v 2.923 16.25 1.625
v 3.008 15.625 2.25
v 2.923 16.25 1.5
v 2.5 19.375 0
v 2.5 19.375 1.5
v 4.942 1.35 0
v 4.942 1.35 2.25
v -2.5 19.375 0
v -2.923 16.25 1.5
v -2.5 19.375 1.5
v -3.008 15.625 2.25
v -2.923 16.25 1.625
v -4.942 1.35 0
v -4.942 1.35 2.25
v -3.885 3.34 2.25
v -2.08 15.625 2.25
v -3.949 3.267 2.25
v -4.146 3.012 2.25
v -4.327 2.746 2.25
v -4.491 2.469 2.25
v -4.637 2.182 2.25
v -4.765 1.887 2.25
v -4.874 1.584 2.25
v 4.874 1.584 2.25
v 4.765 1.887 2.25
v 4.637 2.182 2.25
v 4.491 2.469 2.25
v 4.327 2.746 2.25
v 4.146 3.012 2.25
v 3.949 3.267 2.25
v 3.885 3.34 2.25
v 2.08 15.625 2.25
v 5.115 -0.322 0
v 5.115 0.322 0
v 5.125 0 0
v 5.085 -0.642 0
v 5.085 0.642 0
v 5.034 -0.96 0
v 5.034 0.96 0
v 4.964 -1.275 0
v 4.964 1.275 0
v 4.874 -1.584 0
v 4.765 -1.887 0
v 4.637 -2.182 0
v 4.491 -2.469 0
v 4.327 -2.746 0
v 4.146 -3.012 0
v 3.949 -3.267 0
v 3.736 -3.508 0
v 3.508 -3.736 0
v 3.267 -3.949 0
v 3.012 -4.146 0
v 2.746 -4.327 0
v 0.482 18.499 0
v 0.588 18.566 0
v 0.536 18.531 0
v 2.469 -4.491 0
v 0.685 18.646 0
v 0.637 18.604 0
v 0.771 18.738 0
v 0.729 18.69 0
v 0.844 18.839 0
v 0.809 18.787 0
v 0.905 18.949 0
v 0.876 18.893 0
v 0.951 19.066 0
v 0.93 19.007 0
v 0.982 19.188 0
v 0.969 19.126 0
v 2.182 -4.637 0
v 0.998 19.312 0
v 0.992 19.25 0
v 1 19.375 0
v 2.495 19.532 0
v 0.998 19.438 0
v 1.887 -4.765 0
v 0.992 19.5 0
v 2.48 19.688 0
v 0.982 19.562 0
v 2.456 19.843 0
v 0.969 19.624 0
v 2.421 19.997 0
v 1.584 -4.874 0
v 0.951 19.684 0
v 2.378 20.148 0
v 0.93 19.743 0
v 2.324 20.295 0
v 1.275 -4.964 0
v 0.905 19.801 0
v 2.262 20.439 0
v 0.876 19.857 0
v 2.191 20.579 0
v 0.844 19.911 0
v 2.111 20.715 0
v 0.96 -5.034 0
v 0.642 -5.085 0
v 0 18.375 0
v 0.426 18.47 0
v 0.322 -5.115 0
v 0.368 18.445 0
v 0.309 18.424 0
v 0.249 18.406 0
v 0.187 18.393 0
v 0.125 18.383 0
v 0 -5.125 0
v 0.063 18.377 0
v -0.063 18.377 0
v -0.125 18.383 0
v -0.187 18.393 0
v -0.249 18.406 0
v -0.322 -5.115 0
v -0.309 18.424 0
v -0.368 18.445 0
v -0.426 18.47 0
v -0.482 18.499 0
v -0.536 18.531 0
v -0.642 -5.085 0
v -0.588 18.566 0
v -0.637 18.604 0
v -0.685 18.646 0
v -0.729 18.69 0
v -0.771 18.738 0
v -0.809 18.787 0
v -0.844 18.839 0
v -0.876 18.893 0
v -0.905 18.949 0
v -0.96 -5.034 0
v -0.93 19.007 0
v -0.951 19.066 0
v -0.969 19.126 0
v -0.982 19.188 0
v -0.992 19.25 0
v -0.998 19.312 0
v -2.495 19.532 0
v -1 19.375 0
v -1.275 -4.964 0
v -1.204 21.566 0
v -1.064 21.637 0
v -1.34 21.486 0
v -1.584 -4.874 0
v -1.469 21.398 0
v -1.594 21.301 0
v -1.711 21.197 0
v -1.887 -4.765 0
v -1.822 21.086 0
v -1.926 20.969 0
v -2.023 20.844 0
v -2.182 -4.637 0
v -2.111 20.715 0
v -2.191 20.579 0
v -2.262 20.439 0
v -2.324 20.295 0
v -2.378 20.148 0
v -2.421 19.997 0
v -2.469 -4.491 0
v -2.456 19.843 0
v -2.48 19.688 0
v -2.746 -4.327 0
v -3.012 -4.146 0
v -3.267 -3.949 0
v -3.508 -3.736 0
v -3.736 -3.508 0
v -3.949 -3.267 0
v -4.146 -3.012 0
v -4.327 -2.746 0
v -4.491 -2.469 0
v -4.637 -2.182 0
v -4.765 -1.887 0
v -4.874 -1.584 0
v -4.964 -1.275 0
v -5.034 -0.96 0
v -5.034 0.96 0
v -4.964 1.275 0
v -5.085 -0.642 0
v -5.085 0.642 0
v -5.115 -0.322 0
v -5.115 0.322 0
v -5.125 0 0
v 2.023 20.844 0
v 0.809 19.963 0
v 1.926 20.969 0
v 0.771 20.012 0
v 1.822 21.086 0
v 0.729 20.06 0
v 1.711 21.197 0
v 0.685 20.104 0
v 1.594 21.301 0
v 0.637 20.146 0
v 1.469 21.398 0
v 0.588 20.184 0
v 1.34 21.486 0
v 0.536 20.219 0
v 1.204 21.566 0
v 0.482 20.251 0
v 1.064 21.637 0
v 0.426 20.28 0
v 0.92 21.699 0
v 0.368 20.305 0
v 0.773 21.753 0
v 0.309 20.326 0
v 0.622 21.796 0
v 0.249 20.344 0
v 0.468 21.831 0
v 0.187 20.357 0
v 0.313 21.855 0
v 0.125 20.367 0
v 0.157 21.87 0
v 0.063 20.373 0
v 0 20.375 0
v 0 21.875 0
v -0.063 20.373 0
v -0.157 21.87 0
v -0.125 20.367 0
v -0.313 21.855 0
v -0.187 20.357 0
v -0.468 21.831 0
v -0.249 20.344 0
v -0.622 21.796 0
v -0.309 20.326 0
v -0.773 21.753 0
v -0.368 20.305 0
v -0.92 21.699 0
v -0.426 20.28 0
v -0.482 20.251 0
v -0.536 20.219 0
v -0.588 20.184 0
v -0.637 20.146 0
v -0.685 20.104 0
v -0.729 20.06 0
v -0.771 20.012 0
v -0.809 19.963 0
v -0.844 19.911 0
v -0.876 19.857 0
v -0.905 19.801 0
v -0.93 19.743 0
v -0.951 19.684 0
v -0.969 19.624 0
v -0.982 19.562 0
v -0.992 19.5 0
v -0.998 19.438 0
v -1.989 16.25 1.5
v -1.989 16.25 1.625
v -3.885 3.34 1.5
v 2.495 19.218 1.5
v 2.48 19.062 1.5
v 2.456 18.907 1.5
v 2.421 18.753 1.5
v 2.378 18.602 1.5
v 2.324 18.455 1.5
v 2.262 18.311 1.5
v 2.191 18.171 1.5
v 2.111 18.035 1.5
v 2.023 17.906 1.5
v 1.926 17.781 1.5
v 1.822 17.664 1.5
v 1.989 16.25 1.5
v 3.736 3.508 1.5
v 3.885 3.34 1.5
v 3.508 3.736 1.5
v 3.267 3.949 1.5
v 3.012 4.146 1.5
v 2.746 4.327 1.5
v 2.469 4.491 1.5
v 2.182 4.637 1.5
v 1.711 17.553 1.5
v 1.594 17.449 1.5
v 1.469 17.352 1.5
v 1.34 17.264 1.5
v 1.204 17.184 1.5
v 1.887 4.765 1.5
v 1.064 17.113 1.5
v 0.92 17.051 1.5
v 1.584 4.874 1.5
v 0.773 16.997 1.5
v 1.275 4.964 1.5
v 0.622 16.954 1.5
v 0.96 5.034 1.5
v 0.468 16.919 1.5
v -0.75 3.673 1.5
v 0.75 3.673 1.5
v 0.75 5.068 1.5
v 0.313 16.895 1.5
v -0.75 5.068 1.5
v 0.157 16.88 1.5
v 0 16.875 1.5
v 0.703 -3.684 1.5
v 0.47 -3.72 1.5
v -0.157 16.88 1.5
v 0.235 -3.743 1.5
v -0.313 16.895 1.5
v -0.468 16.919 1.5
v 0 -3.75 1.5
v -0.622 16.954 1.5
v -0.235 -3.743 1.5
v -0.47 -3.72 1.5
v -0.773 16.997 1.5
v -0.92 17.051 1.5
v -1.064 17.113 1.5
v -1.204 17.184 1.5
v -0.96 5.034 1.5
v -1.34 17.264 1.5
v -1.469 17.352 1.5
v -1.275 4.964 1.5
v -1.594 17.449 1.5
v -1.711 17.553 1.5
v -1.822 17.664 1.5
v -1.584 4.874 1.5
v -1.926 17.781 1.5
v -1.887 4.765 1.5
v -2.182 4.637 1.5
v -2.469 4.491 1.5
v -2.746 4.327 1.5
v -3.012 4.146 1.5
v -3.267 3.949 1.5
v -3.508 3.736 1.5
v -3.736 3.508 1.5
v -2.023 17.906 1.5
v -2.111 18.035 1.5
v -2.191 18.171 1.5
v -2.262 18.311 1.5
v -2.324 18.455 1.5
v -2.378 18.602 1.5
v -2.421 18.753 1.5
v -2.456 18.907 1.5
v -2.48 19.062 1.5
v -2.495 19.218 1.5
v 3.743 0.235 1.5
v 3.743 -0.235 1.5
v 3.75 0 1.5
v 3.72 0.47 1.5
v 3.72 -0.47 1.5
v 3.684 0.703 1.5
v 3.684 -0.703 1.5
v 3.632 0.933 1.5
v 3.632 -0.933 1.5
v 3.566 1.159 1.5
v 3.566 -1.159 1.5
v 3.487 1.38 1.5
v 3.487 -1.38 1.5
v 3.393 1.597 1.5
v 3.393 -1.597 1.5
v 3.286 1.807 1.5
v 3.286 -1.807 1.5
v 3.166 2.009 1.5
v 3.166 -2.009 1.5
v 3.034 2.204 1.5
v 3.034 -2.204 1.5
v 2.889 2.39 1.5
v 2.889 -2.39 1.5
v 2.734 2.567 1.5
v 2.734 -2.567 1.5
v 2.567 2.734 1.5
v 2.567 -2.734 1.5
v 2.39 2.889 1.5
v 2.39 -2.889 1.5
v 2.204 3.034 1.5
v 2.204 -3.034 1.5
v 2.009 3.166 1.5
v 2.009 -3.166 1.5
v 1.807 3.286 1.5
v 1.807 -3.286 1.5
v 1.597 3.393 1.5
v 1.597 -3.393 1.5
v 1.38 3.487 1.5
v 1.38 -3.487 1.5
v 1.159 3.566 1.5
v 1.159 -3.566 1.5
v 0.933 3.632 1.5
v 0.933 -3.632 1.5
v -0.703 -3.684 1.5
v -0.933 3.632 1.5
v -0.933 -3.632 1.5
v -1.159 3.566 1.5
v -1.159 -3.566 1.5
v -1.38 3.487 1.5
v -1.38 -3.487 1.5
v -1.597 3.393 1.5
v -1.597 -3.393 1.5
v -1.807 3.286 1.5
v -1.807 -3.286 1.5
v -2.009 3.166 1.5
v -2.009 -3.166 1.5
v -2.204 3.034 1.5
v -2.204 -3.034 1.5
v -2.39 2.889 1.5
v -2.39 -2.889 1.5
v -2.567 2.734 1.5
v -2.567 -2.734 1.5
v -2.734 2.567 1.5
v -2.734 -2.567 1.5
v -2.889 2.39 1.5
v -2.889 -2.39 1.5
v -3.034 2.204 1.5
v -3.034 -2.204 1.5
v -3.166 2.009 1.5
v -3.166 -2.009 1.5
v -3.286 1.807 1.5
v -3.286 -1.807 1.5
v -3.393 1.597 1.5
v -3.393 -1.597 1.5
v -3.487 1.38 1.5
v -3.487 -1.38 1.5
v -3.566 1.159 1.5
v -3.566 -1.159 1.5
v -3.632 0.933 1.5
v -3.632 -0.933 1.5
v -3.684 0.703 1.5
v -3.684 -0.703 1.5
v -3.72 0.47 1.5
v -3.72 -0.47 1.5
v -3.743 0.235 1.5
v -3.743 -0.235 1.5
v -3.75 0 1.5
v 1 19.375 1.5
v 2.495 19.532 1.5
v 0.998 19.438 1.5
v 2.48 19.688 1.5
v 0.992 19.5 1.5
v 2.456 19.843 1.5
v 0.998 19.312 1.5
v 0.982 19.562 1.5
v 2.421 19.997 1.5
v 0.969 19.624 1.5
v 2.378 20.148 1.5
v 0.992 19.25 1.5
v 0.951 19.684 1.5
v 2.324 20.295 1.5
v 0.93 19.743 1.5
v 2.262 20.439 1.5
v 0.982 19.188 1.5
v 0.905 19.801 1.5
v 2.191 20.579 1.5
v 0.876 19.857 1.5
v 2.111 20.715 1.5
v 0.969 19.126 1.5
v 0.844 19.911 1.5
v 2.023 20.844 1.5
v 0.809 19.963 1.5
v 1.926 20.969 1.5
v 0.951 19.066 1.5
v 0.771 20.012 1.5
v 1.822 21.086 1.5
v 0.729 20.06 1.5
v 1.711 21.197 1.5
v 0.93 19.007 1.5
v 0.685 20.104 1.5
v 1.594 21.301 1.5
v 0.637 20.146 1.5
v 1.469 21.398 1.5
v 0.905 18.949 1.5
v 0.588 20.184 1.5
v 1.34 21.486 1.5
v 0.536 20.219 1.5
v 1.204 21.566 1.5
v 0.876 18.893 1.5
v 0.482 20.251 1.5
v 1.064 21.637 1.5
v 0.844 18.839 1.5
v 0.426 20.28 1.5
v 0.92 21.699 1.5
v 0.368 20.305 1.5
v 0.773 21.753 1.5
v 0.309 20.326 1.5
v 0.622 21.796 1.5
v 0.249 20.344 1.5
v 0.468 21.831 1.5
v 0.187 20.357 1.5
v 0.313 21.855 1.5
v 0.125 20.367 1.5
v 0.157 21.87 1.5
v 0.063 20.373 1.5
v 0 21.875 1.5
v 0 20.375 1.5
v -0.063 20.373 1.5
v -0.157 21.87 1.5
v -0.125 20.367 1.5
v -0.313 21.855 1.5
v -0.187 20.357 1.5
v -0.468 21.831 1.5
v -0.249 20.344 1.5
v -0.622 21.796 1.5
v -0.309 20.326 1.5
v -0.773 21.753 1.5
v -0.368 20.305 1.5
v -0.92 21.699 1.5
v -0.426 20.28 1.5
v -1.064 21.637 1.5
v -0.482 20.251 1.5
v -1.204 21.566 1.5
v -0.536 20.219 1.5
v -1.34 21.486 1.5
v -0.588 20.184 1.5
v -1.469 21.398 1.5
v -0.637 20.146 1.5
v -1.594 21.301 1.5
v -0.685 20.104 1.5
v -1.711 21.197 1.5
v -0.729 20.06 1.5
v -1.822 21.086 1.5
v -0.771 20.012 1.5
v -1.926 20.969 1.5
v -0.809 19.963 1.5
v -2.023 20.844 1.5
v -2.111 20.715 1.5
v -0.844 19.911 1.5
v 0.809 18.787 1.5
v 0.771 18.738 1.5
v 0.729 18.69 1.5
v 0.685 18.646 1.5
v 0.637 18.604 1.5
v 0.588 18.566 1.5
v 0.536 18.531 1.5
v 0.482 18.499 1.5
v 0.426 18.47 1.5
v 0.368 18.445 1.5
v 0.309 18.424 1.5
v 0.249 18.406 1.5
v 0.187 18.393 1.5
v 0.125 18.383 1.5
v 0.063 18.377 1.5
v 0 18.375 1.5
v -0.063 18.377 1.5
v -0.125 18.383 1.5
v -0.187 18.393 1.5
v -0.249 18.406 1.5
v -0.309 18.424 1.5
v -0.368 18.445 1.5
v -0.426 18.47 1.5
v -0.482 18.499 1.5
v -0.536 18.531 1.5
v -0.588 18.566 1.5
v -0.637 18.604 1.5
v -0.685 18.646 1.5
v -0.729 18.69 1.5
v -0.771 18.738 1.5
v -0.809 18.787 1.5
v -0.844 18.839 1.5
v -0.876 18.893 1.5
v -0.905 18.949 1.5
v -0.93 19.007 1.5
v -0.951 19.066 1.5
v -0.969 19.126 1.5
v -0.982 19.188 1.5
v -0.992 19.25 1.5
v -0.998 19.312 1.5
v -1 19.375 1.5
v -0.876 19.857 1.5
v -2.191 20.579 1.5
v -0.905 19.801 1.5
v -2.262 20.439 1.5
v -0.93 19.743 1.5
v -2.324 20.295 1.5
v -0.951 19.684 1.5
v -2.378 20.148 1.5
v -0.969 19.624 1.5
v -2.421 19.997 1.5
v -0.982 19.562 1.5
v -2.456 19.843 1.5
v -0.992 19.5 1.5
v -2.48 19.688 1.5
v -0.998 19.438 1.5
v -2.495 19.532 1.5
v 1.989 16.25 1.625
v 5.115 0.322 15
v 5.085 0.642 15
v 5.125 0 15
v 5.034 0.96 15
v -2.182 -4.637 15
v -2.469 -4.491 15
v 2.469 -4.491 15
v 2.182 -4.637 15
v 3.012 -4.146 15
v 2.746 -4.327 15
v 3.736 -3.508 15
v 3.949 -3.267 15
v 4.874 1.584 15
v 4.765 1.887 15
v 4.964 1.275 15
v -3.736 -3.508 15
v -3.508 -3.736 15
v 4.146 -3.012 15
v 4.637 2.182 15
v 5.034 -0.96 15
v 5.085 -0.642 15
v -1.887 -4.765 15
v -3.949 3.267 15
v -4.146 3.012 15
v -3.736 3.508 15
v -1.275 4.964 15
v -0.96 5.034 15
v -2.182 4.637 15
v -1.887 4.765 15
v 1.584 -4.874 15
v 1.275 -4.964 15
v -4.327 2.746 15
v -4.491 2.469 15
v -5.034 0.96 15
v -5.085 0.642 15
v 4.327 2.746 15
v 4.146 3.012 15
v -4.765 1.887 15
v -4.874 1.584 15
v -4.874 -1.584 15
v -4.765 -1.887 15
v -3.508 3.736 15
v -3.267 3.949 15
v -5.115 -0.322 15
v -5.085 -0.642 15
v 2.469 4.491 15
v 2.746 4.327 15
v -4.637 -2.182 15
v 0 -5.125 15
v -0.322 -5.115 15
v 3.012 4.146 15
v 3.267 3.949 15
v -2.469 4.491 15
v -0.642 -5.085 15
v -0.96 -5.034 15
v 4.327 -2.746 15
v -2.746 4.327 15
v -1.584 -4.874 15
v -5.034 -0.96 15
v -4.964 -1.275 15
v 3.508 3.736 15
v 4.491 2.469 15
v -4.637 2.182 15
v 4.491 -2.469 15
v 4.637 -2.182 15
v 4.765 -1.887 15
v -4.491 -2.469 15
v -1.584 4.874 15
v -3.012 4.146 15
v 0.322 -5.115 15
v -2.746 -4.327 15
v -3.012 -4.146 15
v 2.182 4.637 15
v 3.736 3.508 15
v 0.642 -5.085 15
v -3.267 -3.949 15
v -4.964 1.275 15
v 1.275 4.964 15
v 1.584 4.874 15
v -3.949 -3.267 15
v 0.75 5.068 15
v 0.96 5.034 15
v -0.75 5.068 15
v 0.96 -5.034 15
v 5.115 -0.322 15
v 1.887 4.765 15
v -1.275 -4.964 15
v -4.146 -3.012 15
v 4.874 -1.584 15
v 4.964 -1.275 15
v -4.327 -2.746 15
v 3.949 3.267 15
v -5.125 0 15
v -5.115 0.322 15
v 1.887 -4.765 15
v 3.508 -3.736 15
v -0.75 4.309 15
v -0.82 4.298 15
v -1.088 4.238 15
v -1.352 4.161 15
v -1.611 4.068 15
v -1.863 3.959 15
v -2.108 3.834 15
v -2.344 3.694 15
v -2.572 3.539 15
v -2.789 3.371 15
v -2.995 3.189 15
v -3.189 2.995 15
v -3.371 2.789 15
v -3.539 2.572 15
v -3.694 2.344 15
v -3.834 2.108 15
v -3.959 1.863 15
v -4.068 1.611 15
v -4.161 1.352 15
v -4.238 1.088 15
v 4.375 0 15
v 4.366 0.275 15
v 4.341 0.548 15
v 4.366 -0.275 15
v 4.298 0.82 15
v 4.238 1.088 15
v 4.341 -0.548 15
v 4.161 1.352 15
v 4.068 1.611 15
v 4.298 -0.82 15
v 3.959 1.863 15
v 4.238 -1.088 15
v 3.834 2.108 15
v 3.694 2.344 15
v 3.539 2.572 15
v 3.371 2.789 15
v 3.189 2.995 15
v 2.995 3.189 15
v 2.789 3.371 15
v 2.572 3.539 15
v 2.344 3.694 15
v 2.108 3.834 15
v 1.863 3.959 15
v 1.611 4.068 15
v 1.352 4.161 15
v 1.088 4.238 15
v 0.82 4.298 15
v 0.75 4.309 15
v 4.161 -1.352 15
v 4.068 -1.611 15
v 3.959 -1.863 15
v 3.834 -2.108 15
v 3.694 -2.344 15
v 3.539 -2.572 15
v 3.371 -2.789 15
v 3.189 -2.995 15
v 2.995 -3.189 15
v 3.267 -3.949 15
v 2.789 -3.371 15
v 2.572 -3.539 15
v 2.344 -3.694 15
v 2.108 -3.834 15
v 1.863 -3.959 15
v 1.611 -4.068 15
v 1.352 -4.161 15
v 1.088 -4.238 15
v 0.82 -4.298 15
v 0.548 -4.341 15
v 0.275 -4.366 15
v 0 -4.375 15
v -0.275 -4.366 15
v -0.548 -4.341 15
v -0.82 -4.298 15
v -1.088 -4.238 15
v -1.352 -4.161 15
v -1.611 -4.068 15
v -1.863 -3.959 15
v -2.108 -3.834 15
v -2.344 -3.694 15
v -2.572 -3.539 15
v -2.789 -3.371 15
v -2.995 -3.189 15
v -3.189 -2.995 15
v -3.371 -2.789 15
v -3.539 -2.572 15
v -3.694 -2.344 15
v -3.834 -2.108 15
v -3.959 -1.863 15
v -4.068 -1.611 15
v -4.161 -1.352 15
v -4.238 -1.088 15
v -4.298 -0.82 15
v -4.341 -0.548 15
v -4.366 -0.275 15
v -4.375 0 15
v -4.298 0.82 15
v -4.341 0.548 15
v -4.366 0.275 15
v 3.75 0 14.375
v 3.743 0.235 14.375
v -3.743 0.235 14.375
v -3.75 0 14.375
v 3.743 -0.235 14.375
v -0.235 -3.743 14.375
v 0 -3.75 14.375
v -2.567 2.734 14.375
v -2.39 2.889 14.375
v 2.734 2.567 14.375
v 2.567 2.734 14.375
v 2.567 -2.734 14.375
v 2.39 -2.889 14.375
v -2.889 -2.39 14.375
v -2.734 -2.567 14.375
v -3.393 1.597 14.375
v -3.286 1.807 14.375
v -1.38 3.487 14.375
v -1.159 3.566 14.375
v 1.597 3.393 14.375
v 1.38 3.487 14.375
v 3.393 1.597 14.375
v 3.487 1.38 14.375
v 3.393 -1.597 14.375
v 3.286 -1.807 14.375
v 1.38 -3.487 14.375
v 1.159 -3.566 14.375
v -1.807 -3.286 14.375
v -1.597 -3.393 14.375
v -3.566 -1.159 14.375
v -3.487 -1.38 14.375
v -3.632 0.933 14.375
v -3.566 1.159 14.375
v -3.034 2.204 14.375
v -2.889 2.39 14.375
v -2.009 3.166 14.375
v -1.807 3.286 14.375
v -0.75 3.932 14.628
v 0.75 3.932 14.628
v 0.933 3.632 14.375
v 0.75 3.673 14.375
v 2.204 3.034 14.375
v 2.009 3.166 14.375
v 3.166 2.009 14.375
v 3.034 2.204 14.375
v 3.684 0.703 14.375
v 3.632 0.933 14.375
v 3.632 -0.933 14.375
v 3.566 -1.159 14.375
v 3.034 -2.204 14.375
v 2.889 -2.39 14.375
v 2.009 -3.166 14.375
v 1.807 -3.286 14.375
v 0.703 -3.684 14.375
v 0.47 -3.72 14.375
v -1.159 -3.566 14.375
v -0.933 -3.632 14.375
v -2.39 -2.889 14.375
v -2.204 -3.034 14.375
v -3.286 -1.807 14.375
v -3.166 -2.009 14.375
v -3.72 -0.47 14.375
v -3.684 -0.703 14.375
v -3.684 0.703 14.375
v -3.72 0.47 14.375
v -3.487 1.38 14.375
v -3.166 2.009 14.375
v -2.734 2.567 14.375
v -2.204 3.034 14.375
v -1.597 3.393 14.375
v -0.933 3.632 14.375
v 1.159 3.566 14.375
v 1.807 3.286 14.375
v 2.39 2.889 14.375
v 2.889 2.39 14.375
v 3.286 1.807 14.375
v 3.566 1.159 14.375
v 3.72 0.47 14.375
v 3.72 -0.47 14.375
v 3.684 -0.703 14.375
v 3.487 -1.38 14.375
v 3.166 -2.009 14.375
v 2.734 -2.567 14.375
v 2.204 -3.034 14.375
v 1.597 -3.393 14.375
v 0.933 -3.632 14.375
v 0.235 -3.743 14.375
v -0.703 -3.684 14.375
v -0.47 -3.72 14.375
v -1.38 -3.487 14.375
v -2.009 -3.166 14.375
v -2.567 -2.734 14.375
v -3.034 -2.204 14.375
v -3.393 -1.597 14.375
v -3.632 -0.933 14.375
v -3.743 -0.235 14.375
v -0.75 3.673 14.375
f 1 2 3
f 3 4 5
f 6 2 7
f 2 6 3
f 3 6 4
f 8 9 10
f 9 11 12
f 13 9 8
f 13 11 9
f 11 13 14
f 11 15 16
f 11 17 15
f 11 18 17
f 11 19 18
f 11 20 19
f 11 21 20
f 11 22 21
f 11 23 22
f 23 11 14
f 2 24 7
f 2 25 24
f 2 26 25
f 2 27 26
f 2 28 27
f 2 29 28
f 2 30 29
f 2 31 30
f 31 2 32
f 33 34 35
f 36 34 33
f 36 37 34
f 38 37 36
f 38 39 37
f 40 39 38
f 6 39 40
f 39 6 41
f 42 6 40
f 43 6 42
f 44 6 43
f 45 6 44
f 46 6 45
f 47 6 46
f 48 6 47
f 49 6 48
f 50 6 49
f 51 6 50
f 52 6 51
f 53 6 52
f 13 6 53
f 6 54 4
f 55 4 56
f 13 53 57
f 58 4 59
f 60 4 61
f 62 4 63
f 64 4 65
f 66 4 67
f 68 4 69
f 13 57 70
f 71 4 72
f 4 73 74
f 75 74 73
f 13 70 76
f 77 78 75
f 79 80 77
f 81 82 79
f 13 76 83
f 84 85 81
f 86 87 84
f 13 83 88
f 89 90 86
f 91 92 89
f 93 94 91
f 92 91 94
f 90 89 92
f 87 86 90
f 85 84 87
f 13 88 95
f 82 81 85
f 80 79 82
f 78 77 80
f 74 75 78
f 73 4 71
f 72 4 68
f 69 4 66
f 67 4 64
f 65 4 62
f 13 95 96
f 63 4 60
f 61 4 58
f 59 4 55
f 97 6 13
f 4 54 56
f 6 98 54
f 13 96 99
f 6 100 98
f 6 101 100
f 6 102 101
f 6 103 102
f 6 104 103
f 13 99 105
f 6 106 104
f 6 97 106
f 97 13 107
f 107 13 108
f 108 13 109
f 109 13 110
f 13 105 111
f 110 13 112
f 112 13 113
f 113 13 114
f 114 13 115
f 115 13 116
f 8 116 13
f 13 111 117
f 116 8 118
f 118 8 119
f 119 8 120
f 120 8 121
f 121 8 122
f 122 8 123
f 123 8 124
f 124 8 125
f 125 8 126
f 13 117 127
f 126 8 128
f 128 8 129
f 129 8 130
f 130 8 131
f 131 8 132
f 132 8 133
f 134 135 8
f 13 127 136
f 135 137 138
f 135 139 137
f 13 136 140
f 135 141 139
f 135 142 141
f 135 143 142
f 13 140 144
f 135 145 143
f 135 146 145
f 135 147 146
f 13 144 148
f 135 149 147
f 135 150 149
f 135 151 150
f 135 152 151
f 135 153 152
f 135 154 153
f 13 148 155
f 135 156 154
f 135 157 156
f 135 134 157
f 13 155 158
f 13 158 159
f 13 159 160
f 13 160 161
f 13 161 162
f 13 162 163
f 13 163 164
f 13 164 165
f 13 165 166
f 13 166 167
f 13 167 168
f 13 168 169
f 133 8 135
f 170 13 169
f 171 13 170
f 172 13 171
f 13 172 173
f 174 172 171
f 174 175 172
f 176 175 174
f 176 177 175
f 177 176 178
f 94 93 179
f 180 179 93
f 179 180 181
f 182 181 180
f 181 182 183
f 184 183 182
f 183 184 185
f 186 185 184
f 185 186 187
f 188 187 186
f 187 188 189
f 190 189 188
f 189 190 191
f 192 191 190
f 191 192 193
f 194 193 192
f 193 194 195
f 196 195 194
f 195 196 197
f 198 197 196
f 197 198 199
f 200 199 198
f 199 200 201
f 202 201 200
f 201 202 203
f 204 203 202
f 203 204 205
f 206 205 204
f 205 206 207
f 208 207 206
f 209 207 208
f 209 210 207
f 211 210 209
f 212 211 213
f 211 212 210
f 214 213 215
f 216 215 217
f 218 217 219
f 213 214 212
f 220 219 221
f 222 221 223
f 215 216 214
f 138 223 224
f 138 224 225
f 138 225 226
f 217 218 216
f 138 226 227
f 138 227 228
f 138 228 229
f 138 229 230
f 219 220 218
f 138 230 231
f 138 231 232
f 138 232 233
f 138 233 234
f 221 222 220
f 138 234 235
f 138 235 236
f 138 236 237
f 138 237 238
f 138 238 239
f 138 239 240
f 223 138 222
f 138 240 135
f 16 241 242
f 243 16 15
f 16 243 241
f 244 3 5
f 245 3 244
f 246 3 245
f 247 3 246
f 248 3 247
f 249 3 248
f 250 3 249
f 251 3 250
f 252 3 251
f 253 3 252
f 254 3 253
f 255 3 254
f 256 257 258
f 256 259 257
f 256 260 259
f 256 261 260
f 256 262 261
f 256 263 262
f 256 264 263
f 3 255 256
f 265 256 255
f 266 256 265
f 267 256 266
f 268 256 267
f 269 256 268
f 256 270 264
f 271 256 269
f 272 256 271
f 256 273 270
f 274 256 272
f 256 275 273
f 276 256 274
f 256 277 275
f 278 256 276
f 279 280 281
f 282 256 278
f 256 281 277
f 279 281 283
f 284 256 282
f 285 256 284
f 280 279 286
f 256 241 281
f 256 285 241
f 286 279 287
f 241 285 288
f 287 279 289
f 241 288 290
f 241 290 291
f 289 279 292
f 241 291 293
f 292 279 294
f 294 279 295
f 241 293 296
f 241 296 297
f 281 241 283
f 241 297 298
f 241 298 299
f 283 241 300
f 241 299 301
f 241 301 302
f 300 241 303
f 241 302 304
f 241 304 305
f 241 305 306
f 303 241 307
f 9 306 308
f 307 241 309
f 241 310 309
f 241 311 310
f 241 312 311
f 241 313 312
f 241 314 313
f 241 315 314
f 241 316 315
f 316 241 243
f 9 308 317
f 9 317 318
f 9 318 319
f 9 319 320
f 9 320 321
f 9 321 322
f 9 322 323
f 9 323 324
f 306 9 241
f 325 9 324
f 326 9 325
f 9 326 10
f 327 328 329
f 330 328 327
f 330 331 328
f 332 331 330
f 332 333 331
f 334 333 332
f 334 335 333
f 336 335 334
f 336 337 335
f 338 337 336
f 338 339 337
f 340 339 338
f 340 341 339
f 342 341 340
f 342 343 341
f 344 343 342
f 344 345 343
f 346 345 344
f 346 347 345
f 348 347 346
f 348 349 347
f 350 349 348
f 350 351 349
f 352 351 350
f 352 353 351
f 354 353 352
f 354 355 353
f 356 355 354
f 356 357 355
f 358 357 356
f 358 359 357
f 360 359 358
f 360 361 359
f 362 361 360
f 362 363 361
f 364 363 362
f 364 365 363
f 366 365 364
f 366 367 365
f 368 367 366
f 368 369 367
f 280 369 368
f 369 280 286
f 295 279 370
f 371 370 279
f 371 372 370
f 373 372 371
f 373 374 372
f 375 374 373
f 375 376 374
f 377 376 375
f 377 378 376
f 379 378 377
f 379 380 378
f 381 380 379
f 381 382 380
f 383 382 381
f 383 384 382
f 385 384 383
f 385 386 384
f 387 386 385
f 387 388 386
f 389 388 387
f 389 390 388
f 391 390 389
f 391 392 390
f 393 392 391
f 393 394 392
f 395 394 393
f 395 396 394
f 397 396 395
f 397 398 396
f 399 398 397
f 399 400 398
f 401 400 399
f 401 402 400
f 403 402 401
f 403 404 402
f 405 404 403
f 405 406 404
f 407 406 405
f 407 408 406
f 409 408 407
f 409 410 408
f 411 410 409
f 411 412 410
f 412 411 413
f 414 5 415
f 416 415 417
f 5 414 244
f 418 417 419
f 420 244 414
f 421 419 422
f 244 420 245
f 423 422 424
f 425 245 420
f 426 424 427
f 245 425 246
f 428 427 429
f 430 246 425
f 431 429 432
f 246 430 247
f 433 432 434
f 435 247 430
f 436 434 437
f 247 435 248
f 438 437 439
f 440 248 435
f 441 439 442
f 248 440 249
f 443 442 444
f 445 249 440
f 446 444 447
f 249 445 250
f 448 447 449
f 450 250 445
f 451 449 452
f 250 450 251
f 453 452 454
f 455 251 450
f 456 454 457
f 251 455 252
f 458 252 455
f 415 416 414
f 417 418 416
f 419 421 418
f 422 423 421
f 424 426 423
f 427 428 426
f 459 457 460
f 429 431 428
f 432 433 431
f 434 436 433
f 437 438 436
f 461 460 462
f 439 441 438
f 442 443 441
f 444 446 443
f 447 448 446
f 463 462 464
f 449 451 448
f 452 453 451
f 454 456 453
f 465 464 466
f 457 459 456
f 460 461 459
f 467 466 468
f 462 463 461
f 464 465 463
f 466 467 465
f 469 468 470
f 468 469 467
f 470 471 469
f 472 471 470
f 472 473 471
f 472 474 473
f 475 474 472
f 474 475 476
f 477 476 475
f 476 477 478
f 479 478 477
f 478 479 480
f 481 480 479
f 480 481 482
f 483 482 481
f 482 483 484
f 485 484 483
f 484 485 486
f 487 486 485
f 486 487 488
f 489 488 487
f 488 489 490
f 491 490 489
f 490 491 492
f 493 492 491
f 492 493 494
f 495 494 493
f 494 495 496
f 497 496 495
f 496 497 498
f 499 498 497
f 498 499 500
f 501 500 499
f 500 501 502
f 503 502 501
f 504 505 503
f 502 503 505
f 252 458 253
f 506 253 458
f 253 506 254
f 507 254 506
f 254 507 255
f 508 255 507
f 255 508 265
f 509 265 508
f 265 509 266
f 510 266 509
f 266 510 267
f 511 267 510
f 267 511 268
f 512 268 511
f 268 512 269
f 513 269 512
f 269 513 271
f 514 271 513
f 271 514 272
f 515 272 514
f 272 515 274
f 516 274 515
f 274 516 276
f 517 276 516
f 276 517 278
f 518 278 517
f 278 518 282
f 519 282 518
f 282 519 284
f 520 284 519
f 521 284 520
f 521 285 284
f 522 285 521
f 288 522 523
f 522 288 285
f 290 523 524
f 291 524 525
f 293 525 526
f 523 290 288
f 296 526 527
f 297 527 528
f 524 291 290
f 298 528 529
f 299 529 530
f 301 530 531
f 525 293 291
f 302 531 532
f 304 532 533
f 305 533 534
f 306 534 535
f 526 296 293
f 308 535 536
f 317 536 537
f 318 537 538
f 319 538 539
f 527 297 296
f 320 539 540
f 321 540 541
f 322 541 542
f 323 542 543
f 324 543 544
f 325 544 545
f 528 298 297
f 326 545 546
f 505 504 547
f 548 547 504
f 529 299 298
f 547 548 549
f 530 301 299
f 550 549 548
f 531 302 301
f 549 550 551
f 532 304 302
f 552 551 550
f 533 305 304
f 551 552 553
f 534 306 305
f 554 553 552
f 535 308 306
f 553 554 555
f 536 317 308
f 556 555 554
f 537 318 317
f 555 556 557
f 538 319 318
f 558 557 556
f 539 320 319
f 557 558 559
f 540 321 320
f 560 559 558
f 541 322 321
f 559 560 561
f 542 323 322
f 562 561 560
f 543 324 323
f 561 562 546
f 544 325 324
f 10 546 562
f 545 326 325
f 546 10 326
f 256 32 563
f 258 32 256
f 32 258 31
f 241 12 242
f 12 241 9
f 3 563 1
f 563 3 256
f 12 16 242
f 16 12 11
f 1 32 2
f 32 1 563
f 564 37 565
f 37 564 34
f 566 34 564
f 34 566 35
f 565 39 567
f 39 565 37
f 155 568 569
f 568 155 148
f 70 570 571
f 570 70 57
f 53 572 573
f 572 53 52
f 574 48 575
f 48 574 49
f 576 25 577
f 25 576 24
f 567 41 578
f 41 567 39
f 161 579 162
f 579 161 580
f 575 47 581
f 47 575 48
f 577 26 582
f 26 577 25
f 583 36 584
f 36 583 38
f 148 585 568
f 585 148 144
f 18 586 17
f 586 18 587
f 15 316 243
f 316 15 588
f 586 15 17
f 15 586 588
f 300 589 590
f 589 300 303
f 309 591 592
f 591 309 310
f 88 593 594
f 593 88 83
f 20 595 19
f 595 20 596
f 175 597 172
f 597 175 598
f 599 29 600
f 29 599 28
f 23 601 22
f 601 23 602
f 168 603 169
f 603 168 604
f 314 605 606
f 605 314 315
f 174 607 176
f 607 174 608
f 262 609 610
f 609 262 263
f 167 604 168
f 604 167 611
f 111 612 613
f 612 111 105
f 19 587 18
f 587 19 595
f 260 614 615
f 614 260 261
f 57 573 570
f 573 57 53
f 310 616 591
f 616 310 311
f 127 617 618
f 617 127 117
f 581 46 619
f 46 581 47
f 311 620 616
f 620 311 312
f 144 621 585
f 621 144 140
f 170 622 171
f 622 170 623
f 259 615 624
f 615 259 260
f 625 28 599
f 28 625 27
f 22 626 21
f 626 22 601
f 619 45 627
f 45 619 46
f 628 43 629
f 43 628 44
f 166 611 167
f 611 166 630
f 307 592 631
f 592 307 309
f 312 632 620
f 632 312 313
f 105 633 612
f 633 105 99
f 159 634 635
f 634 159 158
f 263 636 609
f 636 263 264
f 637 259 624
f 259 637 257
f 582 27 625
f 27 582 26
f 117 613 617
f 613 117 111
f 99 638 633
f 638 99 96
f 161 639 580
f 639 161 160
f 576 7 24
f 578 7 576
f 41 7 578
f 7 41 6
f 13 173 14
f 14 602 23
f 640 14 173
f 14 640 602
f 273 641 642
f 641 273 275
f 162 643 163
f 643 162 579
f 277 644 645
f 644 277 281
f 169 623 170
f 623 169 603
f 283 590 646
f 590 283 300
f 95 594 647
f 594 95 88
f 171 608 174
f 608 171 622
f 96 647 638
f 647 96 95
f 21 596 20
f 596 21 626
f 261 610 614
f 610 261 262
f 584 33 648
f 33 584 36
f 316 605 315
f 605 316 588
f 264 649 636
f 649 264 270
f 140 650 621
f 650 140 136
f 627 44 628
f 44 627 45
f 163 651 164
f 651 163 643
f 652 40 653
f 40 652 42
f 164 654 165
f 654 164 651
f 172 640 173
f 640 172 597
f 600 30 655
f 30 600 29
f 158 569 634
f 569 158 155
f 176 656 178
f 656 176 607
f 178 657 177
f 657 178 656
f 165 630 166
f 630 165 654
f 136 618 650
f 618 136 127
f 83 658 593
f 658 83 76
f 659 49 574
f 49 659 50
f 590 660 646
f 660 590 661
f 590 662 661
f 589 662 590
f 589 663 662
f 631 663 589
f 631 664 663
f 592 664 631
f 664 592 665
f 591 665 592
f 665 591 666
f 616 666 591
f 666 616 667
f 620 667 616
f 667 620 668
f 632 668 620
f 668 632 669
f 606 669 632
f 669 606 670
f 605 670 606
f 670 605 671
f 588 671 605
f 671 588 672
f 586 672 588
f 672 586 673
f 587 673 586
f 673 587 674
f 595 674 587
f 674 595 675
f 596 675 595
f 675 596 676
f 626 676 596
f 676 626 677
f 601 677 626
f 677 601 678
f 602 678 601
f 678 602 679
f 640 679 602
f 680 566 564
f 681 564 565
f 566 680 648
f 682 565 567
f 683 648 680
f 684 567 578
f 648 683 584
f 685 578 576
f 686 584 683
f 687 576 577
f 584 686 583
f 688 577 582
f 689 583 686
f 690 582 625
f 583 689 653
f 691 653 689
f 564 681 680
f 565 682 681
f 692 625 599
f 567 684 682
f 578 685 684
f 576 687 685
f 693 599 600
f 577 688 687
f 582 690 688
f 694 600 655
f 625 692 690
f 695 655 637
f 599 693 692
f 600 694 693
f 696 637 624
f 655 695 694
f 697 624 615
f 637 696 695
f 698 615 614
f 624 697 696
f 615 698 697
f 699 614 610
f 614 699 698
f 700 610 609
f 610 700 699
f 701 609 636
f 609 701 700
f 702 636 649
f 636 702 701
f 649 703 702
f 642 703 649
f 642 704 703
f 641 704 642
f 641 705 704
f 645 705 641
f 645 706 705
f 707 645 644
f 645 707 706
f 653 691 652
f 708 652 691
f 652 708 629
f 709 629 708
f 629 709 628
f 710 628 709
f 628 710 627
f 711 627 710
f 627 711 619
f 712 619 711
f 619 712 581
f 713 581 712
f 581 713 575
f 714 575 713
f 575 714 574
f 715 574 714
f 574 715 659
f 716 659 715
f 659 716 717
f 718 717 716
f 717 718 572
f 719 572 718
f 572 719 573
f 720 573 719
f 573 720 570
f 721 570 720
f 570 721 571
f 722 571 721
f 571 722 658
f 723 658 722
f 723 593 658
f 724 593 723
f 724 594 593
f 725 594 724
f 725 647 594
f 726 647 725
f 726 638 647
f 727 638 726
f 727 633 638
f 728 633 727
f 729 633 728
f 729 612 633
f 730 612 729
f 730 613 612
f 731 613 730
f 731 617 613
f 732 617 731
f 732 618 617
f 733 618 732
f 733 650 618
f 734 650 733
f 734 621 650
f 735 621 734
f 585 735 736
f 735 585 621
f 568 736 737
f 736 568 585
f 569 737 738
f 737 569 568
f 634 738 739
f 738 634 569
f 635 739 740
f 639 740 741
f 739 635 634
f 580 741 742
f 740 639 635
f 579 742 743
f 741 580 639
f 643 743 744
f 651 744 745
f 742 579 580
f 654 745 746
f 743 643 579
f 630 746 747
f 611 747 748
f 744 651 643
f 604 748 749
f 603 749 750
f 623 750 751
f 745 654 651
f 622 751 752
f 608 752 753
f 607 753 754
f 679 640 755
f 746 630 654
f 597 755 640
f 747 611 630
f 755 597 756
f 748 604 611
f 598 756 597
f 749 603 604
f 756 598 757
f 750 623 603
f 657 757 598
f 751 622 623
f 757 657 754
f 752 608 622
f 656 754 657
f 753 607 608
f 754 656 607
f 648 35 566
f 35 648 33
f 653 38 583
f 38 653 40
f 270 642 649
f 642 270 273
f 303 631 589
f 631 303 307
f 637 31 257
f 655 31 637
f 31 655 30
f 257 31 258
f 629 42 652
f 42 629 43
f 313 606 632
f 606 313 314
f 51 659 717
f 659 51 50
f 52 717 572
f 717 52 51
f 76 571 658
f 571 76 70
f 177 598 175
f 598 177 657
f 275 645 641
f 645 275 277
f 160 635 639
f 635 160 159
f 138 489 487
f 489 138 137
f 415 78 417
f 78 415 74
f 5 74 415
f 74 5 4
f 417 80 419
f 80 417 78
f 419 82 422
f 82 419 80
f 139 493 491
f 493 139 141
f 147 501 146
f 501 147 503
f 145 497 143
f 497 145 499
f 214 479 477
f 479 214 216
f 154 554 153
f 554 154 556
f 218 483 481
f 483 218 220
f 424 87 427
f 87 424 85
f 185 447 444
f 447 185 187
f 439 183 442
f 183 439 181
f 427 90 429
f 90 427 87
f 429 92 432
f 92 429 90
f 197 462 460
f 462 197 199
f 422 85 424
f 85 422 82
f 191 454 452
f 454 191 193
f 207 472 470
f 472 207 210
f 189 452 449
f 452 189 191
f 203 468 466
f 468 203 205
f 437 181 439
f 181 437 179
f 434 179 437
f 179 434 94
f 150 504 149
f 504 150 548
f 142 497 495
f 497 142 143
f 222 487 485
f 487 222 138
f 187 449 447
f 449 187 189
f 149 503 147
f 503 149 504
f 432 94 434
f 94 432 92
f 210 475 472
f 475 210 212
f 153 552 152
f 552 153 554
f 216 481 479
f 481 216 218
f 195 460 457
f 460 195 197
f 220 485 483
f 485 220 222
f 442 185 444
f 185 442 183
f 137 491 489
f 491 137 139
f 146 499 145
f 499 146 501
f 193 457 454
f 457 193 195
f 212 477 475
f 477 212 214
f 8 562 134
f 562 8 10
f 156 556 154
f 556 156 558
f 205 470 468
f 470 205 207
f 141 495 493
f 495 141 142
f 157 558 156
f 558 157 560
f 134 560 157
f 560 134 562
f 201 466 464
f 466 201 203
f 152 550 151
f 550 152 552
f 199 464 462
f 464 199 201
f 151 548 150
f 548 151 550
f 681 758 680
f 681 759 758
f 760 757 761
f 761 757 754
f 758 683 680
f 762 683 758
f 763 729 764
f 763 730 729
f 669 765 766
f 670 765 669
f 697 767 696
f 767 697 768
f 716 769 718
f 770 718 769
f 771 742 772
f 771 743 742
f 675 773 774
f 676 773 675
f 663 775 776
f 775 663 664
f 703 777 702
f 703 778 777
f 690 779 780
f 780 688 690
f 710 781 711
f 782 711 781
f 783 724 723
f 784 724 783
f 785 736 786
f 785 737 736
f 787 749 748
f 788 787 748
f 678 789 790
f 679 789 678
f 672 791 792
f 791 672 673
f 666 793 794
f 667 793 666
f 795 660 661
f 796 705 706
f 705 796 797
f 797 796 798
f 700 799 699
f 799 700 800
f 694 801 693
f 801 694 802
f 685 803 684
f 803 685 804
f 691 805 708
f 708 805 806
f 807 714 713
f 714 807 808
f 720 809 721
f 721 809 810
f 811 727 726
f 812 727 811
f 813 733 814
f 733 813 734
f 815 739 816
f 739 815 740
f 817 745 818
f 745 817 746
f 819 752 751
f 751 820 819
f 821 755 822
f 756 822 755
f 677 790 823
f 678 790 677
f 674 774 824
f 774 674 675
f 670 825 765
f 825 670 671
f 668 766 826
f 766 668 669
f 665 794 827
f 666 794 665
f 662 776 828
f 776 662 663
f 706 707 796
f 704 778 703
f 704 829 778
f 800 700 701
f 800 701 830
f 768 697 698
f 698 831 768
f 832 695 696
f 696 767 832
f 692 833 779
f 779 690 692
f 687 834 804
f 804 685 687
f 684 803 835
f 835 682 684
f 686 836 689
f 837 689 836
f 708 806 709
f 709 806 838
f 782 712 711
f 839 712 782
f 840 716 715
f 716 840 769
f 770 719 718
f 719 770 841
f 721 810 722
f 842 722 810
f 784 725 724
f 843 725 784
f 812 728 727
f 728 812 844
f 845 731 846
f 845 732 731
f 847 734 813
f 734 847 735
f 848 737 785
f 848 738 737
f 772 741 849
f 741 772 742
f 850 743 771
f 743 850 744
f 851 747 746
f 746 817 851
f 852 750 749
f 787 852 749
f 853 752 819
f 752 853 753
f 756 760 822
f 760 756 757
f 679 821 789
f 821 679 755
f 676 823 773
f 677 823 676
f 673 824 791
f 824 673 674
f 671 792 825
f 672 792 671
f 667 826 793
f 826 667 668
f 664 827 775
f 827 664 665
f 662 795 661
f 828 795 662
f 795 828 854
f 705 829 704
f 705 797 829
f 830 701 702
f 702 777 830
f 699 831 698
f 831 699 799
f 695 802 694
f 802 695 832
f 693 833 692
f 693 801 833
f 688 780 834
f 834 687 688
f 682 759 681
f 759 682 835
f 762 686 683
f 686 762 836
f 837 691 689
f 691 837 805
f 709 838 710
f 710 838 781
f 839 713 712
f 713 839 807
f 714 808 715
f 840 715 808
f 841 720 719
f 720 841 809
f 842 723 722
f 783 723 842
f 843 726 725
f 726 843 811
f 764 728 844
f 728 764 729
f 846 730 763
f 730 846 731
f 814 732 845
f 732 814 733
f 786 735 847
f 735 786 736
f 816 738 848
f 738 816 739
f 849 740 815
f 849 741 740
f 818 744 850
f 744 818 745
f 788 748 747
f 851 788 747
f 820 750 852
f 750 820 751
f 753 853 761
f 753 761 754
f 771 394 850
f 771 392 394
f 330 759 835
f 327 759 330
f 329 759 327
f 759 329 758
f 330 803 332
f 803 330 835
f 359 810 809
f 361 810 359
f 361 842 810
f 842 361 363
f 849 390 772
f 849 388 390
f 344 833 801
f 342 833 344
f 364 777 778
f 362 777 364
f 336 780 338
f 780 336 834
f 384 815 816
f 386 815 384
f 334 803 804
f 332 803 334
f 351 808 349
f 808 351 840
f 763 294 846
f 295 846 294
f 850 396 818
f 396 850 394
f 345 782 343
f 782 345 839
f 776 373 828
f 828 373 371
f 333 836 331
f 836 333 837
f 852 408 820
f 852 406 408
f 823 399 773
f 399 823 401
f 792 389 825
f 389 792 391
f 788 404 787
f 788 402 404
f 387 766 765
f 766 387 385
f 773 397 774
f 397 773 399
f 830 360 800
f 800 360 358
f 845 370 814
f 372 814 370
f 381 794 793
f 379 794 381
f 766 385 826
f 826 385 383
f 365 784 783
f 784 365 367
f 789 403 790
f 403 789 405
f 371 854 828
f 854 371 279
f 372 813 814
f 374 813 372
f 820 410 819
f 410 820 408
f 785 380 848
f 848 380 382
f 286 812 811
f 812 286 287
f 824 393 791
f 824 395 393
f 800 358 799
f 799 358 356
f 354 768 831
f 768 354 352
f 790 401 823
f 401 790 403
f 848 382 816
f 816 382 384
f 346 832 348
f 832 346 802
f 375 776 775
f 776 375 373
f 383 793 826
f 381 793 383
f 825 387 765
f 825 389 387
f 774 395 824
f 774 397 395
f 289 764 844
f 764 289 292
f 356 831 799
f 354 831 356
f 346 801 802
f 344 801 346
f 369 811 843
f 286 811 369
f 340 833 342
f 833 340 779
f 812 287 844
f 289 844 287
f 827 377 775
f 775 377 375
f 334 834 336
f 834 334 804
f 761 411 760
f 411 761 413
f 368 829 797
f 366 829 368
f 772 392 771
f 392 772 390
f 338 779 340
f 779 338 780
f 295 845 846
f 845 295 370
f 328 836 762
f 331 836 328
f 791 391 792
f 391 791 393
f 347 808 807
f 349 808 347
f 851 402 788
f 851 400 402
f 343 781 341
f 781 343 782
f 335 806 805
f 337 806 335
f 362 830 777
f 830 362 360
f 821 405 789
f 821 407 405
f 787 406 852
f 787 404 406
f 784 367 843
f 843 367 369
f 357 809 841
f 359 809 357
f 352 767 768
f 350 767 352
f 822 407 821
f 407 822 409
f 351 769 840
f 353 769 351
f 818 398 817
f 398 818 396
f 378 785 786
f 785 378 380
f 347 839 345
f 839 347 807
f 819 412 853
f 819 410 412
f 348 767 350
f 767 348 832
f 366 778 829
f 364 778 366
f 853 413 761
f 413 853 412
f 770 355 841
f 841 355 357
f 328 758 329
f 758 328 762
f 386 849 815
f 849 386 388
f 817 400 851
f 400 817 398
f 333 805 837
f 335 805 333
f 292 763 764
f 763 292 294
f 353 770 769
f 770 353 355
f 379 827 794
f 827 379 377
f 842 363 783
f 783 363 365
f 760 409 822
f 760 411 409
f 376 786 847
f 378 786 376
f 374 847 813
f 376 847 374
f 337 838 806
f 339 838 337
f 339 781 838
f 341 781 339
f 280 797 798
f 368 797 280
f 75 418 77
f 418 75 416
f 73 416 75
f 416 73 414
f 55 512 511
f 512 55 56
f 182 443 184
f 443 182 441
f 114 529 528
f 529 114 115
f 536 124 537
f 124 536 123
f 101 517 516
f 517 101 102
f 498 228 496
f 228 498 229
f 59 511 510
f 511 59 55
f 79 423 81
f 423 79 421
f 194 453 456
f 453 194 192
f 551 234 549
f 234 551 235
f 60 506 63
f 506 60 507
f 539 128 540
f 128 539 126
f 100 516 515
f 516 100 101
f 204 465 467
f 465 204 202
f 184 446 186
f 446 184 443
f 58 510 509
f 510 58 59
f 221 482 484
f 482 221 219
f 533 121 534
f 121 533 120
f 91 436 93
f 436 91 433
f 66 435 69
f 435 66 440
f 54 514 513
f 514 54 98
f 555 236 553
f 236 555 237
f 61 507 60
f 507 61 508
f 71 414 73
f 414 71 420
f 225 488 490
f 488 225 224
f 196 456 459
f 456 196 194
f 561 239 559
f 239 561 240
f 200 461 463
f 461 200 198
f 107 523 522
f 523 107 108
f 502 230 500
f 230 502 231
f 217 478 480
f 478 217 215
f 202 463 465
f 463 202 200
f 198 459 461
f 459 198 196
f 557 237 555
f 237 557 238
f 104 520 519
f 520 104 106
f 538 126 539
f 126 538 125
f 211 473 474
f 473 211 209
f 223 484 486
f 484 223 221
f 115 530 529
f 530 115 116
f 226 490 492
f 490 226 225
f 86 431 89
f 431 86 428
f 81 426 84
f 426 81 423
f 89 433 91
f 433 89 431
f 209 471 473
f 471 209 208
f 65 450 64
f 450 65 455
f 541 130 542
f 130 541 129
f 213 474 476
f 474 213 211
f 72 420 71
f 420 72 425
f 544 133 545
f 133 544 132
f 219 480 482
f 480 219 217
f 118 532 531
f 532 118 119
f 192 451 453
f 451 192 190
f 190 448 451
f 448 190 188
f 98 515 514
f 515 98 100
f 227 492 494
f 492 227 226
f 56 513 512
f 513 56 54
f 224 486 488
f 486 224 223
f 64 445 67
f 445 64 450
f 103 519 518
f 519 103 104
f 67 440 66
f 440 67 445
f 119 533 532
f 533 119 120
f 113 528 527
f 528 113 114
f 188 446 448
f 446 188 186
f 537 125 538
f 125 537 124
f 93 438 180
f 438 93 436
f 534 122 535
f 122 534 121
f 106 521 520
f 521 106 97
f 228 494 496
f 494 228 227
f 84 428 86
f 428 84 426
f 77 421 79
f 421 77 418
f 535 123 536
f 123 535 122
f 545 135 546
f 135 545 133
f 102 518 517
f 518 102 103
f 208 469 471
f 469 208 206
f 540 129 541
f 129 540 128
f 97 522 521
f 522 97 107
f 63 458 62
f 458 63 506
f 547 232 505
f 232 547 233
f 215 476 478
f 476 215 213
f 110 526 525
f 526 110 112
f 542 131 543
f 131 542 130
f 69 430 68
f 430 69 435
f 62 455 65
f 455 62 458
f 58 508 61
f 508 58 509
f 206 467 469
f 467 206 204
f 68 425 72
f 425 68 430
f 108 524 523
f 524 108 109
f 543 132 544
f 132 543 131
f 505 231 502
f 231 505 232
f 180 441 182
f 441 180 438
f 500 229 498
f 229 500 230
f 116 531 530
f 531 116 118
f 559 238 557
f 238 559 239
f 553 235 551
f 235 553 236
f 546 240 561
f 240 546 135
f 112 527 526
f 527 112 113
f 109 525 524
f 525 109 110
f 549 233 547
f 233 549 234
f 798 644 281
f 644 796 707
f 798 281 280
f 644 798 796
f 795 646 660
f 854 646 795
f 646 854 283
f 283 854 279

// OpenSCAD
$fn=100;

// Parameters
motor_diameter=7;
extra_room = 0.25;
wall_thickness = 1.5;
arm_thickness = 1.5;
total_length=27;
screw_hole_diameter = 2;
holder_height=15;
bracing_lines = 1; // set to 0 to disable

// Pre-calculated values
large_end_inner_diameter = motor_diameter + extra_room;
small_end_radius = screw_hole_diameter/2 + wall_thickness;
large_end_radius = large_end_inner_diameter/2 + wall_thickness;
holder_diameter = large_end_inner_diameter + 2*wall_thickness;
arm_length = total_length-(small_end_radius+large_end_radius);


difference() {
    union() {
        // Large end cylinder
        cylinder(h=holder_height, d=holder_diameter);
        
        // Small end cylinder
        translate([0,arm_length,0])
            cylinder(h=arm_thickness, d=screw_hole_diameter + 2*wall_thickness);
        
        if (bracing_lines == 1) {
            difference() {
                // Arm polygon
                linear_extrude(height=arm_thickness*1.5) 
                    polygon(points= [[holder_diameter/2,0], 
                                    [-(holder_diameter/2),0],
                                    [-small_end_radius,arm_length],
                                    [small_end_radius,arm_length]]);
                
                // Cutout the arm polygon to make bracing lines
                translate([0,0,arm_thickness])
                    linear_extrude(height=arm_thickness*2) 
                        polygon(points= [[holder_diameter/2-arm_thickness/2,0], 
                                    [-(holder_diameter/2-arm_thickness/2),0],
                                    [-(small_end_radius-arm_thickness/2),arm_length-arm_thickness],
                                    [small_end_radius-arm_thickness/2,arm_length-arm_thickness]]);
                
                // Cleanup the ends so they don't block the screw hole
                translate([0, arm_length-arm_thickness, arm_thickness+small_end_radius])
                    cube([3*small_end_radius, small_end_radius+arm_thickness/2, 2*small_end_radius], center=true);
                
                // Chamfer the edge of the brace by the screw hole
                // NOTE: This translate isn't quite right, but it seems to work
                translate([0,arm_length-(small_end_radius+arm_thickness/3),arm_thickness+sqrt(pow(3*small_end_radius,2)/2)]) rotate([45,0,0]) cube(3*small_end_radius, center=true);
                
            }
        } else {
            linear_extrude(height=arm_thickness) 
                polygon(points= [[holder_diameter/2,0], 
                                [-(holder_diameter/2),0],
                                [-small_end_radius,arm_length],
                                [small_end_radius,arm_length]]);
        }
    }

    // Chamfer the top
    // NOTE: Not sure about this translate either
    translate([0,0,holder_height - large_end_radius + (wall_thickness/2)]) cylinder(r1=0, r2=large_end_radius, h=large_end_radius);

    // Cutout the motor hole
    translate([0,0,arm_thickness])
        cylinder(h=20, d=large_end_inner_diameter + extra_room);
    
    // Cutout the screw hole
    translate([0,arm_length,-1]) 
        cylinder(h=arm_thickness*4, d=screw_hole_diameter);
    
    // Cut out the expansion slot
    translate([-(wall_thickness/2), large_end_radius/2, arm_thickness]) 
        cube([wall_thickness, wall_thickness*2, holder_height]);

}
